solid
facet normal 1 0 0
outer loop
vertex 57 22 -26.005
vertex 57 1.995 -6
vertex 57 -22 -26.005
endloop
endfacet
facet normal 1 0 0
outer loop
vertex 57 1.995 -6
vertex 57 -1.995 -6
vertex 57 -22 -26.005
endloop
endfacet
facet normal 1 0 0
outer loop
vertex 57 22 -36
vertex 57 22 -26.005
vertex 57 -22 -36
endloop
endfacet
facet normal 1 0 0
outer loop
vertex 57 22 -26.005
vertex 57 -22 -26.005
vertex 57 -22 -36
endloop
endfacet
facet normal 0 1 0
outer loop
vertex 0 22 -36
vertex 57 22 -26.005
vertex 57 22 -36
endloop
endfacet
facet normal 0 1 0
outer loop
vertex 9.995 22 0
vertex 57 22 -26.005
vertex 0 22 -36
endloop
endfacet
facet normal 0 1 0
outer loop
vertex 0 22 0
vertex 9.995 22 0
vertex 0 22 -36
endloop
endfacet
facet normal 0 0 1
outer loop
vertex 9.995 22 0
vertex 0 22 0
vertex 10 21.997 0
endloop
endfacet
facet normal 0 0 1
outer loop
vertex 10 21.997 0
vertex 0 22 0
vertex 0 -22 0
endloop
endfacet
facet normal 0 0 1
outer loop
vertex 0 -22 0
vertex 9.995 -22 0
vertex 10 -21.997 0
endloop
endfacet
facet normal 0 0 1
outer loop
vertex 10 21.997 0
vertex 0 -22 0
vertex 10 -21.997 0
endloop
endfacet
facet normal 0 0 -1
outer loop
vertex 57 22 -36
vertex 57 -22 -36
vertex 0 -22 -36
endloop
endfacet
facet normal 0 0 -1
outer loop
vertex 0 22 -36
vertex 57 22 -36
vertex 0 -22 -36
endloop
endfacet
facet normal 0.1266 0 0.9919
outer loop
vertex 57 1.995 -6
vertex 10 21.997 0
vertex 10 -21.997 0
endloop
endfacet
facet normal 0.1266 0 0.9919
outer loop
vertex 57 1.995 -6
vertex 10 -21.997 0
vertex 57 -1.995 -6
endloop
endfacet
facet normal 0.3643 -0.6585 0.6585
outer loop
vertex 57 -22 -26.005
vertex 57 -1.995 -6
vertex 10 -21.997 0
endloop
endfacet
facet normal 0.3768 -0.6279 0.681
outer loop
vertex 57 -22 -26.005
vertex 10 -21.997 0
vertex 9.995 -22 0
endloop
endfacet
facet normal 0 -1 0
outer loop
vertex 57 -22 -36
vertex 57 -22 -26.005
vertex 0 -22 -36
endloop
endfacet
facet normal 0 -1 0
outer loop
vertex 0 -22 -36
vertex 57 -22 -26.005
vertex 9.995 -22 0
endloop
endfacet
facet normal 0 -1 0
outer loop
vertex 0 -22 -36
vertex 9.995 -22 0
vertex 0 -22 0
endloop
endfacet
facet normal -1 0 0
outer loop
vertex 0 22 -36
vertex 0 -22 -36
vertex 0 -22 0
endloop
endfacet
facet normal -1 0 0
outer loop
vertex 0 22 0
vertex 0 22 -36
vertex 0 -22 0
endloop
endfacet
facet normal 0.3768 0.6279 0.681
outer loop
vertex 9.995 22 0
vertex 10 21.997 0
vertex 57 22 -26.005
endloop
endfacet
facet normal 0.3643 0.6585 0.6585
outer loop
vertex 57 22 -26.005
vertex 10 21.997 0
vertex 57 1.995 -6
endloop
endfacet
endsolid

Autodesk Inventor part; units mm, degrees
ref_plane "YZ Plane" through (0, 0, 0) normal (1, 0, 0) x (0, 1, 0)
ref_plane "XZ Plane" through (0, 0, 0) normal (0, 1, 0) x (-1, 0, 0)
sketch "草圖1" plane through (0, 0, 0) normal (0, 1, 0) x (-1, 0, 0)
  line L0 (0, 0) -> (-57, 0)
  line L1 (-57, 0) -> (-57, -36)
  line L2 (-57, -36) -> (0, -36)
  line L3 (0, -36) -> (0, 0)
  dimension "d0" = 57
  dimension "d1" = 36
extrude "擠出1" add sketch "草圖1" along normal mid plane 44
sketch "草圖2" plane through (0, 22, 0) normal (0, 1, 0) x (1, 0, 0)
  line L0 (0, 0) -> (57, 0) projected
  line L1 (10, 0) -> (57, 6)
  line L2 (57, 0) -> (57, 36) projected
  dimension "d4" = 10
  dimension "d5" = 30
extrude "擠出2" cut sketch "草圖2" against normal blind 60
sketch "草圖3" plane through (57, -22, -36) normal (1, 0, 0) x (0, 0, -1)
  line L0 (-30, 24) -> (-10, 44)
  line L1 (0, 44) -> (-36, 44) projected
  line L2 (-30, 44) -> (-30, 0) projected
  point P0 (-36, 22)
  point P1 (-30, 2)
  dimension "d8" = 20
  dimension "d9" = 20
ref_plane "工作平面1" through (10, 22, 0) normal (-0.3643, -0.6585, -0.6585) x (0.875, 0, -0.4841)
sketch "草圖4" plane through (10, 22, 0) normal (-0.3643, -0.6585, -0.6585) x (0.875, 0, -0.4841)
  line L0 (-15.1543, -12.3218) -> (93.717, -12.3218)
  line L1 (93.717, -12.3218) -> (93.717, 28.8166)
  line L2 (93.717, 28.8166) -> (-15.1543, 28.8166)
  line L3 (-15.1543, 28.8166) -> (-15.1543, -12.3218)
  point P0 (-8.7503, 13.3688)
extrude "擠出3" cut sketch "草圖4" against normal blind 40
mirror "鏡射1" about plane through (0, 0, 0) normal (0, 1, 0) of "擠出3"
properties part number "47"
